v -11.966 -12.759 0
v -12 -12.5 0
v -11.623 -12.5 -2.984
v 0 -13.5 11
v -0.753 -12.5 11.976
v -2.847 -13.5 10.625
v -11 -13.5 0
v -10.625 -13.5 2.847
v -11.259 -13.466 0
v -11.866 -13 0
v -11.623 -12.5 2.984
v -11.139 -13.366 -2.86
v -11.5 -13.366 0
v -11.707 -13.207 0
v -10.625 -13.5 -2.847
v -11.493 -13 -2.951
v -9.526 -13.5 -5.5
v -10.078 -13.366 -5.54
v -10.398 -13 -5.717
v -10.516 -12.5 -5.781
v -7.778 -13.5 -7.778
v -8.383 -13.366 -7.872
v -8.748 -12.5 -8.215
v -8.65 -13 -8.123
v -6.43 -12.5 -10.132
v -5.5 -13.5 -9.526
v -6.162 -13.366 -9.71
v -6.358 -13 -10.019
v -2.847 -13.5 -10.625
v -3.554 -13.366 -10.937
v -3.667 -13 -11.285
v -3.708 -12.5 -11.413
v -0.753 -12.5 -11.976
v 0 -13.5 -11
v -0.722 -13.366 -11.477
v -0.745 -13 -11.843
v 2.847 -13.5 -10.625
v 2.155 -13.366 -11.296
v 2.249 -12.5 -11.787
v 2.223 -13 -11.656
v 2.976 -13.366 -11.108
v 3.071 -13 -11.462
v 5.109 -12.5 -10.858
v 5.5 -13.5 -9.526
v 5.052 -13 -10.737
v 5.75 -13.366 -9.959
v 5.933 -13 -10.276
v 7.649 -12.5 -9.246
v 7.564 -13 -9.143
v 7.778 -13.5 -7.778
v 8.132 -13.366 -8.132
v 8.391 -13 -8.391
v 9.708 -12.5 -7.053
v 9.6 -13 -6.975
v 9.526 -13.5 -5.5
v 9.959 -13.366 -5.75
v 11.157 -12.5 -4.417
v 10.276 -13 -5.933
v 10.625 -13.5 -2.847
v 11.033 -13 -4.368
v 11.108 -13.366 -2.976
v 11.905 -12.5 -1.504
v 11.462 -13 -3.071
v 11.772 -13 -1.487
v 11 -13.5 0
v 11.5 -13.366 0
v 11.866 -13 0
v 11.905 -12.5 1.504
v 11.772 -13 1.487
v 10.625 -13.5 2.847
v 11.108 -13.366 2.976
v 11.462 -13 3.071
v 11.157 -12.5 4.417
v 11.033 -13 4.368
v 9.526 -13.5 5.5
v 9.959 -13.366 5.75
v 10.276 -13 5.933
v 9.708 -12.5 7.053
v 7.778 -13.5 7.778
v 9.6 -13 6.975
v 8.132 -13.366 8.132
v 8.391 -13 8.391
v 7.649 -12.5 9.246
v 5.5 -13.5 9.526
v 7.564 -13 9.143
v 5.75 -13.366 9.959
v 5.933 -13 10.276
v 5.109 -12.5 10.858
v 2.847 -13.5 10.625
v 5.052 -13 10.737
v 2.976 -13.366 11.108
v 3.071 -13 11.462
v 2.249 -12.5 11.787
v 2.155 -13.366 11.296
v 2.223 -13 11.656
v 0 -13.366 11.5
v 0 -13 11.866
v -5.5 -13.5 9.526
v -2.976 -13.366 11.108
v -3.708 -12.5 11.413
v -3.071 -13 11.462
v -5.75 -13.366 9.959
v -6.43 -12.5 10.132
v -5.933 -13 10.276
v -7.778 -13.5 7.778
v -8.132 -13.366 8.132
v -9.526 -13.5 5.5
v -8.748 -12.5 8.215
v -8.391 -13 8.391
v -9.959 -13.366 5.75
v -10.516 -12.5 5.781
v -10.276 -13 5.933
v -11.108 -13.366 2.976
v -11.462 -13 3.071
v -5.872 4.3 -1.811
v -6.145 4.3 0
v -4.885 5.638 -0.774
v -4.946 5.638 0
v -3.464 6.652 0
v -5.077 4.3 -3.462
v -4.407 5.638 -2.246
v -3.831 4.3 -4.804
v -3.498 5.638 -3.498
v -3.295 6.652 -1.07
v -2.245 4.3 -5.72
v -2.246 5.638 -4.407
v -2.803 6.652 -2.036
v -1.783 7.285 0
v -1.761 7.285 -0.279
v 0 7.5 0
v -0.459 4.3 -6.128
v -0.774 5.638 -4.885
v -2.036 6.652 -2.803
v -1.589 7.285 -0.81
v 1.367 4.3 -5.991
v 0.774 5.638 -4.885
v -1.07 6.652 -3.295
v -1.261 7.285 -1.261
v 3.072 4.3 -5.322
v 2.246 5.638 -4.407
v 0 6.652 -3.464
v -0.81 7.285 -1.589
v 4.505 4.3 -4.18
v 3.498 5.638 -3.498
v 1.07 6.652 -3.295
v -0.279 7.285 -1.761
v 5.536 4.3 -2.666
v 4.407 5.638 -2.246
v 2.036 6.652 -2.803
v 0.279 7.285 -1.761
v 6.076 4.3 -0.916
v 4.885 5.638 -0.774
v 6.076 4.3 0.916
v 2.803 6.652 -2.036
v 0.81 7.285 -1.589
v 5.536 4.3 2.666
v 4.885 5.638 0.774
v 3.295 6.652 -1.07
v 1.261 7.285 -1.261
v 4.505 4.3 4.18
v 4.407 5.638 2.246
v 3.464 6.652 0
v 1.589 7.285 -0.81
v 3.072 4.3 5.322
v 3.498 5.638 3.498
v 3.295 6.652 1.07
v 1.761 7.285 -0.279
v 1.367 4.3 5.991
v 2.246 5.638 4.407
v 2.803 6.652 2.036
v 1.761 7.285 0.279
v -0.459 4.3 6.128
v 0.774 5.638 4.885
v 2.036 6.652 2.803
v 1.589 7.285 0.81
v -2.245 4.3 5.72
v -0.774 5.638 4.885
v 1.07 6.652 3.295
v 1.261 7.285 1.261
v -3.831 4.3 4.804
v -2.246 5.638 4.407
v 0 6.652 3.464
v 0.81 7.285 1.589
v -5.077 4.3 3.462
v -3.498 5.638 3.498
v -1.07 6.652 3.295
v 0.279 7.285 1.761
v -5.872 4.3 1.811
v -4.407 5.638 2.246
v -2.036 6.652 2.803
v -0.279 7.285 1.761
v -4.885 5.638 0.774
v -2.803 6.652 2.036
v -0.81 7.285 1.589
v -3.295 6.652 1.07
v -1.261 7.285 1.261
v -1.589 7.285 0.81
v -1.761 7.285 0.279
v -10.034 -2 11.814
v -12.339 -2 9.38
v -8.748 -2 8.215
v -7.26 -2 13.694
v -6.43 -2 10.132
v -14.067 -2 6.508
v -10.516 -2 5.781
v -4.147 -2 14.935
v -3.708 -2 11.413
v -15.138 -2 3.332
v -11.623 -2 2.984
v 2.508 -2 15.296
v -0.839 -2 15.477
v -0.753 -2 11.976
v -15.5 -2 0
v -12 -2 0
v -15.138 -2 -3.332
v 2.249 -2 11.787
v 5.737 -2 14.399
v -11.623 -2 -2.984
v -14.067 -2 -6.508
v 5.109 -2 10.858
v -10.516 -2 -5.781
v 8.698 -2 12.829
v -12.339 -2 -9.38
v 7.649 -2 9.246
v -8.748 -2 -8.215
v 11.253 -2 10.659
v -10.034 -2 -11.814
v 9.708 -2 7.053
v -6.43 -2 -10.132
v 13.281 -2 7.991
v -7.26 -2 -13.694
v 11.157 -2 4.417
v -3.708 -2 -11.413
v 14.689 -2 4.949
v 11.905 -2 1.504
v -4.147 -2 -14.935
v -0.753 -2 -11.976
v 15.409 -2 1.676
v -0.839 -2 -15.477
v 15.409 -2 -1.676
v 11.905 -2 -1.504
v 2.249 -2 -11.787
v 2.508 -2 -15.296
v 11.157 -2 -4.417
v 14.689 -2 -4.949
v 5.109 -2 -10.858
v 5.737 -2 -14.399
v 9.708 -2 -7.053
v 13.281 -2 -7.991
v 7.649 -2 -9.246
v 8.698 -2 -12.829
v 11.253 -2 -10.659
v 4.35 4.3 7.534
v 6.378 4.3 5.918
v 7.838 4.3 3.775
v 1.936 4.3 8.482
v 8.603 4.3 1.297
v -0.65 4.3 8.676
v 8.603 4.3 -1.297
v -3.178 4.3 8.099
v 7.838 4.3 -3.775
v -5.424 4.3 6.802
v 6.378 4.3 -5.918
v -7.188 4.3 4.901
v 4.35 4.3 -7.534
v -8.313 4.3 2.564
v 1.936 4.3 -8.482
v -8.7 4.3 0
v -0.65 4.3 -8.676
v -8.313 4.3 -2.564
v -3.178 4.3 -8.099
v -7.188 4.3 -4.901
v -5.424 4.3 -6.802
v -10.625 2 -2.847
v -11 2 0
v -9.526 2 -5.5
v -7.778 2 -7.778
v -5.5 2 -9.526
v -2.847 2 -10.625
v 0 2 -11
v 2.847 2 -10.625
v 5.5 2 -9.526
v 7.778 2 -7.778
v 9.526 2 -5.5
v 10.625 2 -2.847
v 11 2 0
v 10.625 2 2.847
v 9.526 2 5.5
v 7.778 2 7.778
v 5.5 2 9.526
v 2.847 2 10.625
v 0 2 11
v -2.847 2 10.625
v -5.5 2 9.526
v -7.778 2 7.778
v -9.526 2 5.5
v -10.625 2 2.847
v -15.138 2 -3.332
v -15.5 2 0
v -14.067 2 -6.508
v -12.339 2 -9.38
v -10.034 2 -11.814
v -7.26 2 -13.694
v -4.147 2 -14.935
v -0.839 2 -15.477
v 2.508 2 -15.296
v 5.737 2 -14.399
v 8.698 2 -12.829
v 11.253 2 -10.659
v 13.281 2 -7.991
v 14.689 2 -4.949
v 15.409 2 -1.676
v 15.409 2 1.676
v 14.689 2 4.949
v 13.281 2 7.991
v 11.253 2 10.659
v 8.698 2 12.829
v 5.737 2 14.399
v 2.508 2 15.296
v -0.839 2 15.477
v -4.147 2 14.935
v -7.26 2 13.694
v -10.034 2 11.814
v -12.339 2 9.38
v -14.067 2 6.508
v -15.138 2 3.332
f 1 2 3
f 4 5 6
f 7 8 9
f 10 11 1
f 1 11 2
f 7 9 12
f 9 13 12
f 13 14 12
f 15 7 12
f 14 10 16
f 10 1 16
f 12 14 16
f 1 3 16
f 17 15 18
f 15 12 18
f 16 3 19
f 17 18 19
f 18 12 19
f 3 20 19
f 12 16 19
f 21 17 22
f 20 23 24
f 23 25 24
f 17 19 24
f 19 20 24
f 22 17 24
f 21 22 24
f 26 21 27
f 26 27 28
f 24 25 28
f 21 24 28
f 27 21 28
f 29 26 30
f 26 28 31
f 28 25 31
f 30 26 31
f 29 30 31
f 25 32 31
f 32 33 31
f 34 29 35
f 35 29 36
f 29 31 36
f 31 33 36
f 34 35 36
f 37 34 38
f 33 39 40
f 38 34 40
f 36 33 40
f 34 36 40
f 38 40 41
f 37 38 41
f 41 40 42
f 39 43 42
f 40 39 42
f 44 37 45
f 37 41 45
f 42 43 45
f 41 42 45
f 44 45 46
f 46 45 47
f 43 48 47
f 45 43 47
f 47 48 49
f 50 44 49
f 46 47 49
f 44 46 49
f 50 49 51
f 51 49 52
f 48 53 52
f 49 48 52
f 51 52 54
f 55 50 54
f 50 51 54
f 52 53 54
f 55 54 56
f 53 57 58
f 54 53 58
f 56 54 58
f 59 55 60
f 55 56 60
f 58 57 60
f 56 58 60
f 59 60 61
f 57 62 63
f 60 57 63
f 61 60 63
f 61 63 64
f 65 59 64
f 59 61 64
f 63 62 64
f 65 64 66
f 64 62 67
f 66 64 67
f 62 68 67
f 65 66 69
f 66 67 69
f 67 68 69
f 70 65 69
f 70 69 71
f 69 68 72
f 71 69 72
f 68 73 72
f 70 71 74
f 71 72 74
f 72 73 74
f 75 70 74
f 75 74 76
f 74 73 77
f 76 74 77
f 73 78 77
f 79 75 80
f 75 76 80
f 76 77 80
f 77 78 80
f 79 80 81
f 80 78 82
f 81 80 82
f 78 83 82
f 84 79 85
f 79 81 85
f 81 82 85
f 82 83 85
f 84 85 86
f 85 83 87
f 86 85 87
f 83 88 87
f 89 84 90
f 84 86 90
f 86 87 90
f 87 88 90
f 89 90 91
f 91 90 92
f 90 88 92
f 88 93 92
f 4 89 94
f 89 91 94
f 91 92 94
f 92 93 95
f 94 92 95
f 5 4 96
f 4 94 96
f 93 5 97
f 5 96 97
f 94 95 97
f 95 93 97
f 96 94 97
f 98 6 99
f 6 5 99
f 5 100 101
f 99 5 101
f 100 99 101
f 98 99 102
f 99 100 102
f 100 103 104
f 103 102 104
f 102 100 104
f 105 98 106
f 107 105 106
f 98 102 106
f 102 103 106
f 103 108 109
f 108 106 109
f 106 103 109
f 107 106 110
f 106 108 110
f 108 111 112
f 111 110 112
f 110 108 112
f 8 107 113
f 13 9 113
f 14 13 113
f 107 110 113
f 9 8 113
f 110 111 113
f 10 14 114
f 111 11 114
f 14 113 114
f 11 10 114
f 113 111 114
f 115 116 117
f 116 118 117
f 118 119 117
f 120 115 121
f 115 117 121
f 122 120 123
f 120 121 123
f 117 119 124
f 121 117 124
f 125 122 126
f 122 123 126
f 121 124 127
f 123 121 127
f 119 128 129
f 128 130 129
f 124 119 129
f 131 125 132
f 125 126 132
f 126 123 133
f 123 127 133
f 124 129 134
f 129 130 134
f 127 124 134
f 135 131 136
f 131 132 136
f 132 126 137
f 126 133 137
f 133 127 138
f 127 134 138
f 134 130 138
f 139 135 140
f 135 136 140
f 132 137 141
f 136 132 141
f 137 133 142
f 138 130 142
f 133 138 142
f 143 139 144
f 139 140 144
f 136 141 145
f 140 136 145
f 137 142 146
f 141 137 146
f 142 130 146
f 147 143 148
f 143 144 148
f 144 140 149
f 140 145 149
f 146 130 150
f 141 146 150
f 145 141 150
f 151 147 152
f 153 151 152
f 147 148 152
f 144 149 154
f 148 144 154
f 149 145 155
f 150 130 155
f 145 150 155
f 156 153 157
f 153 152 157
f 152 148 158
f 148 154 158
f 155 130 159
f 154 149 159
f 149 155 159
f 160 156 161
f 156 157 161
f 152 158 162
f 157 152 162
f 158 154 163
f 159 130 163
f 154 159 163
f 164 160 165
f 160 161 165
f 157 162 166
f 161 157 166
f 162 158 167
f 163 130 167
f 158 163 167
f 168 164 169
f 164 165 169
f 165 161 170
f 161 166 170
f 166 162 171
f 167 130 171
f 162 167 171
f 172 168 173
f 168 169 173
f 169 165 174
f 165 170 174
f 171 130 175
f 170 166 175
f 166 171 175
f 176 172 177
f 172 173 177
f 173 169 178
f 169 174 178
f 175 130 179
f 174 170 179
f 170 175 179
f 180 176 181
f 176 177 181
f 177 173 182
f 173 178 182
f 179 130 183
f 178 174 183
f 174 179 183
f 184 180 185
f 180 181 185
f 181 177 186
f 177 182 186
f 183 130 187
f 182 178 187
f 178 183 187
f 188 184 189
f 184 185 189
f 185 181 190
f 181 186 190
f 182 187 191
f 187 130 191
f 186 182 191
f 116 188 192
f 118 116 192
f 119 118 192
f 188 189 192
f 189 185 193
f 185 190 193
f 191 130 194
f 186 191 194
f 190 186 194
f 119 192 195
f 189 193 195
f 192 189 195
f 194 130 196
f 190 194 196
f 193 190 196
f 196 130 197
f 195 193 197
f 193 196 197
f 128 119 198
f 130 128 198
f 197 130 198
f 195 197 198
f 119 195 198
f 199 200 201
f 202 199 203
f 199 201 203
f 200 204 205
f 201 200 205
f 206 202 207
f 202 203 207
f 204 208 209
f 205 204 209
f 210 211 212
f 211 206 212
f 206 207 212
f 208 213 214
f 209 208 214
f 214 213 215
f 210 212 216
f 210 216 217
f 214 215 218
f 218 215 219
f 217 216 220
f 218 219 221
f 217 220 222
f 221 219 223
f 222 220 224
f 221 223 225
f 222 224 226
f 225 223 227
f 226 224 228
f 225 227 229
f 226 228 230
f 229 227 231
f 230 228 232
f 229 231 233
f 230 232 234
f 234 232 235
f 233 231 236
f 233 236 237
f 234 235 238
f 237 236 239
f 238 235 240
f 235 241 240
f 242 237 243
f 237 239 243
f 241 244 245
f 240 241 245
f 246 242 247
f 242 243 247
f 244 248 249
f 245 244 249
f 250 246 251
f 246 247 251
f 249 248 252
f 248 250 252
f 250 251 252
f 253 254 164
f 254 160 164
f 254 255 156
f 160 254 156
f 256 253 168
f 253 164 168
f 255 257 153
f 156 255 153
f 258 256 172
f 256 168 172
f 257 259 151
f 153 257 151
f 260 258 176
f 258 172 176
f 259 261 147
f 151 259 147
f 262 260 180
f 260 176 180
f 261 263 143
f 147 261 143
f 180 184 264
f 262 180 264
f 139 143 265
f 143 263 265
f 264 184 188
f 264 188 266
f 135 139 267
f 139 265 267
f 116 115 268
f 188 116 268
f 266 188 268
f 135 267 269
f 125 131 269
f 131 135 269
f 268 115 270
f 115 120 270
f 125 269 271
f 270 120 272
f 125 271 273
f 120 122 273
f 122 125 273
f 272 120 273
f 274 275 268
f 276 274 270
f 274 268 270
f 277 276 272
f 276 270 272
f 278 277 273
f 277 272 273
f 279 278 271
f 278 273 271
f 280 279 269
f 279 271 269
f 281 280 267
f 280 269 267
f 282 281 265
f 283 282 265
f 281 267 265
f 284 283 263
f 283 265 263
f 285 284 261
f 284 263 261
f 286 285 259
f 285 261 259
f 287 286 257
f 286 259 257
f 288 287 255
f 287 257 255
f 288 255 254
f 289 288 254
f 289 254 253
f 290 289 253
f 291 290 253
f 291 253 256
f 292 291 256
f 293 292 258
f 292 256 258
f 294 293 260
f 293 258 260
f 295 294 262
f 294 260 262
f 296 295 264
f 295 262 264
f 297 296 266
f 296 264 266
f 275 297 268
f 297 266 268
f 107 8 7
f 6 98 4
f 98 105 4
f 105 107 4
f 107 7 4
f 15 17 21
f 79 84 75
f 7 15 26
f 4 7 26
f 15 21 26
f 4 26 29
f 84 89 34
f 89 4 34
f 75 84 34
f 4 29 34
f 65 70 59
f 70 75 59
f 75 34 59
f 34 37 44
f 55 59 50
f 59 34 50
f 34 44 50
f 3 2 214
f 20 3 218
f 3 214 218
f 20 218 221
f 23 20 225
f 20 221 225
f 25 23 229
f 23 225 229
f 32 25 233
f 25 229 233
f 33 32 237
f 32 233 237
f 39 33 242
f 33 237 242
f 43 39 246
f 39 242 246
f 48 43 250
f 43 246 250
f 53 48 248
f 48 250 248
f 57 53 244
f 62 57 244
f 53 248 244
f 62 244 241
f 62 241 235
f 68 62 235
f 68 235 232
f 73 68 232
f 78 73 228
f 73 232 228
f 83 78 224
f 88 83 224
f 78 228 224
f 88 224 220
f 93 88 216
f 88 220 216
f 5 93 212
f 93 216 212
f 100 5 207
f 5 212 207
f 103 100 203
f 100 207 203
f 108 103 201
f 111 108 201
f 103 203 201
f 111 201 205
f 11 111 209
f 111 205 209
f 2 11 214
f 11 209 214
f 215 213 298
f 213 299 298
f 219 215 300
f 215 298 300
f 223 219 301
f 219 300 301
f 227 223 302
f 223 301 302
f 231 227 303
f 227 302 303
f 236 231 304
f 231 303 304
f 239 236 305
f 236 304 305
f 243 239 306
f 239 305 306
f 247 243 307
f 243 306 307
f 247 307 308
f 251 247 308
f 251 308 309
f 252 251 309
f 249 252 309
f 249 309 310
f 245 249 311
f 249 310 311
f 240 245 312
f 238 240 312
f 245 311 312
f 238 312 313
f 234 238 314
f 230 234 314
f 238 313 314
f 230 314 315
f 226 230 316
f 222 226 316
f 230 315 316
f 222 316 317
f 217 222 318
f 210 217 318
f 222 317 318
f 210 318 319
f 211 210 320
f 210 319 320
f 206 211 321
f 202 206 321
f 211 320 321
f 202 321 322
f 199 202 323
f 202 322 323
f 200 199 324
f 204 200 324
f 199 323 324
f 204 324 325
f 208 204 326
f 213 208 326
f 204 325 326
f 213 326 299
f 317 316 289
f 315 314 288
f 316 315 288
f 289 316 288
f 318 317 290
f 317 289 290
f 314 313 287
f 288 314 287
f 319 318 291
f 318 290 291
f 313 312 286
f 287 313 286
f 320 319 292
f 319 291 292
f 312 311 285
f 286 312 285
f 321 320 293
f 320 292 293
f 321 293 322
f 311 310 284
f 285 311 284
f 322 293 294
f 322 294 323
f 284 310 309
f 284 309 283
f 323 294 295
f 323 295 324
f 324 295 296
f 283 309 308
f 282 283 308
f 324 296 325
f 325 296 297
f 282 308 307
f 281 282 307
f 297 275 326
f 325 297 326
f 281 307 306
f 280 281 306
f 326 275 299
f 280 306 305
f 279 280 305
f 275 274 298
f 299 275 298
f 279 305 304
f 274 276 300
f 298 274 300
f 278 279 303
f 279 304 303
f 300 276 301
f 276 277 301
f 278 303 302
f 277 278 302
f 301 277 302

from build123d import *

# Parameters (mm, degrees)
FILLET1_R = 1


with BuildPart() as part:
    # Esquisse1 → Révolution1 (revolve)
    with BuildSketch(Plane.XY):
        with BuildLine():
            Line((-12, -2), (-15.5, -2))
            Line((-15.5, -2), (-15.5, 2))
            Line((-15.5, 2), (-11, 2))
            Line((-11, 2), (-8.7, 4.3))
            Line((-8.7, 4.3), (-6.144916598, 4.3))
            ThreePointArc((-6.144916598, 4.3), (-3.464101615, 6.652067348), (0, 7.5))
            Line((0, 7.5), (0, -13.5))
            Line((0, -13.5), (-12, -13.5))
            Line((-12, -13.5), (-12, -12))
            Line((-12, -12), (-12, -2))
        make_face()
    revolve(axis=Axis((0, 7.5, 0), (0, -1, 0)))

    # Fillet1
    fillet1_edges = [part.edges().sort_by_distance(p)[0] for p in [
        (12, -13.5, 0),
    ]]
    fillet(fillet1_edges, radius=FILLET1_R)


solid = part.part
